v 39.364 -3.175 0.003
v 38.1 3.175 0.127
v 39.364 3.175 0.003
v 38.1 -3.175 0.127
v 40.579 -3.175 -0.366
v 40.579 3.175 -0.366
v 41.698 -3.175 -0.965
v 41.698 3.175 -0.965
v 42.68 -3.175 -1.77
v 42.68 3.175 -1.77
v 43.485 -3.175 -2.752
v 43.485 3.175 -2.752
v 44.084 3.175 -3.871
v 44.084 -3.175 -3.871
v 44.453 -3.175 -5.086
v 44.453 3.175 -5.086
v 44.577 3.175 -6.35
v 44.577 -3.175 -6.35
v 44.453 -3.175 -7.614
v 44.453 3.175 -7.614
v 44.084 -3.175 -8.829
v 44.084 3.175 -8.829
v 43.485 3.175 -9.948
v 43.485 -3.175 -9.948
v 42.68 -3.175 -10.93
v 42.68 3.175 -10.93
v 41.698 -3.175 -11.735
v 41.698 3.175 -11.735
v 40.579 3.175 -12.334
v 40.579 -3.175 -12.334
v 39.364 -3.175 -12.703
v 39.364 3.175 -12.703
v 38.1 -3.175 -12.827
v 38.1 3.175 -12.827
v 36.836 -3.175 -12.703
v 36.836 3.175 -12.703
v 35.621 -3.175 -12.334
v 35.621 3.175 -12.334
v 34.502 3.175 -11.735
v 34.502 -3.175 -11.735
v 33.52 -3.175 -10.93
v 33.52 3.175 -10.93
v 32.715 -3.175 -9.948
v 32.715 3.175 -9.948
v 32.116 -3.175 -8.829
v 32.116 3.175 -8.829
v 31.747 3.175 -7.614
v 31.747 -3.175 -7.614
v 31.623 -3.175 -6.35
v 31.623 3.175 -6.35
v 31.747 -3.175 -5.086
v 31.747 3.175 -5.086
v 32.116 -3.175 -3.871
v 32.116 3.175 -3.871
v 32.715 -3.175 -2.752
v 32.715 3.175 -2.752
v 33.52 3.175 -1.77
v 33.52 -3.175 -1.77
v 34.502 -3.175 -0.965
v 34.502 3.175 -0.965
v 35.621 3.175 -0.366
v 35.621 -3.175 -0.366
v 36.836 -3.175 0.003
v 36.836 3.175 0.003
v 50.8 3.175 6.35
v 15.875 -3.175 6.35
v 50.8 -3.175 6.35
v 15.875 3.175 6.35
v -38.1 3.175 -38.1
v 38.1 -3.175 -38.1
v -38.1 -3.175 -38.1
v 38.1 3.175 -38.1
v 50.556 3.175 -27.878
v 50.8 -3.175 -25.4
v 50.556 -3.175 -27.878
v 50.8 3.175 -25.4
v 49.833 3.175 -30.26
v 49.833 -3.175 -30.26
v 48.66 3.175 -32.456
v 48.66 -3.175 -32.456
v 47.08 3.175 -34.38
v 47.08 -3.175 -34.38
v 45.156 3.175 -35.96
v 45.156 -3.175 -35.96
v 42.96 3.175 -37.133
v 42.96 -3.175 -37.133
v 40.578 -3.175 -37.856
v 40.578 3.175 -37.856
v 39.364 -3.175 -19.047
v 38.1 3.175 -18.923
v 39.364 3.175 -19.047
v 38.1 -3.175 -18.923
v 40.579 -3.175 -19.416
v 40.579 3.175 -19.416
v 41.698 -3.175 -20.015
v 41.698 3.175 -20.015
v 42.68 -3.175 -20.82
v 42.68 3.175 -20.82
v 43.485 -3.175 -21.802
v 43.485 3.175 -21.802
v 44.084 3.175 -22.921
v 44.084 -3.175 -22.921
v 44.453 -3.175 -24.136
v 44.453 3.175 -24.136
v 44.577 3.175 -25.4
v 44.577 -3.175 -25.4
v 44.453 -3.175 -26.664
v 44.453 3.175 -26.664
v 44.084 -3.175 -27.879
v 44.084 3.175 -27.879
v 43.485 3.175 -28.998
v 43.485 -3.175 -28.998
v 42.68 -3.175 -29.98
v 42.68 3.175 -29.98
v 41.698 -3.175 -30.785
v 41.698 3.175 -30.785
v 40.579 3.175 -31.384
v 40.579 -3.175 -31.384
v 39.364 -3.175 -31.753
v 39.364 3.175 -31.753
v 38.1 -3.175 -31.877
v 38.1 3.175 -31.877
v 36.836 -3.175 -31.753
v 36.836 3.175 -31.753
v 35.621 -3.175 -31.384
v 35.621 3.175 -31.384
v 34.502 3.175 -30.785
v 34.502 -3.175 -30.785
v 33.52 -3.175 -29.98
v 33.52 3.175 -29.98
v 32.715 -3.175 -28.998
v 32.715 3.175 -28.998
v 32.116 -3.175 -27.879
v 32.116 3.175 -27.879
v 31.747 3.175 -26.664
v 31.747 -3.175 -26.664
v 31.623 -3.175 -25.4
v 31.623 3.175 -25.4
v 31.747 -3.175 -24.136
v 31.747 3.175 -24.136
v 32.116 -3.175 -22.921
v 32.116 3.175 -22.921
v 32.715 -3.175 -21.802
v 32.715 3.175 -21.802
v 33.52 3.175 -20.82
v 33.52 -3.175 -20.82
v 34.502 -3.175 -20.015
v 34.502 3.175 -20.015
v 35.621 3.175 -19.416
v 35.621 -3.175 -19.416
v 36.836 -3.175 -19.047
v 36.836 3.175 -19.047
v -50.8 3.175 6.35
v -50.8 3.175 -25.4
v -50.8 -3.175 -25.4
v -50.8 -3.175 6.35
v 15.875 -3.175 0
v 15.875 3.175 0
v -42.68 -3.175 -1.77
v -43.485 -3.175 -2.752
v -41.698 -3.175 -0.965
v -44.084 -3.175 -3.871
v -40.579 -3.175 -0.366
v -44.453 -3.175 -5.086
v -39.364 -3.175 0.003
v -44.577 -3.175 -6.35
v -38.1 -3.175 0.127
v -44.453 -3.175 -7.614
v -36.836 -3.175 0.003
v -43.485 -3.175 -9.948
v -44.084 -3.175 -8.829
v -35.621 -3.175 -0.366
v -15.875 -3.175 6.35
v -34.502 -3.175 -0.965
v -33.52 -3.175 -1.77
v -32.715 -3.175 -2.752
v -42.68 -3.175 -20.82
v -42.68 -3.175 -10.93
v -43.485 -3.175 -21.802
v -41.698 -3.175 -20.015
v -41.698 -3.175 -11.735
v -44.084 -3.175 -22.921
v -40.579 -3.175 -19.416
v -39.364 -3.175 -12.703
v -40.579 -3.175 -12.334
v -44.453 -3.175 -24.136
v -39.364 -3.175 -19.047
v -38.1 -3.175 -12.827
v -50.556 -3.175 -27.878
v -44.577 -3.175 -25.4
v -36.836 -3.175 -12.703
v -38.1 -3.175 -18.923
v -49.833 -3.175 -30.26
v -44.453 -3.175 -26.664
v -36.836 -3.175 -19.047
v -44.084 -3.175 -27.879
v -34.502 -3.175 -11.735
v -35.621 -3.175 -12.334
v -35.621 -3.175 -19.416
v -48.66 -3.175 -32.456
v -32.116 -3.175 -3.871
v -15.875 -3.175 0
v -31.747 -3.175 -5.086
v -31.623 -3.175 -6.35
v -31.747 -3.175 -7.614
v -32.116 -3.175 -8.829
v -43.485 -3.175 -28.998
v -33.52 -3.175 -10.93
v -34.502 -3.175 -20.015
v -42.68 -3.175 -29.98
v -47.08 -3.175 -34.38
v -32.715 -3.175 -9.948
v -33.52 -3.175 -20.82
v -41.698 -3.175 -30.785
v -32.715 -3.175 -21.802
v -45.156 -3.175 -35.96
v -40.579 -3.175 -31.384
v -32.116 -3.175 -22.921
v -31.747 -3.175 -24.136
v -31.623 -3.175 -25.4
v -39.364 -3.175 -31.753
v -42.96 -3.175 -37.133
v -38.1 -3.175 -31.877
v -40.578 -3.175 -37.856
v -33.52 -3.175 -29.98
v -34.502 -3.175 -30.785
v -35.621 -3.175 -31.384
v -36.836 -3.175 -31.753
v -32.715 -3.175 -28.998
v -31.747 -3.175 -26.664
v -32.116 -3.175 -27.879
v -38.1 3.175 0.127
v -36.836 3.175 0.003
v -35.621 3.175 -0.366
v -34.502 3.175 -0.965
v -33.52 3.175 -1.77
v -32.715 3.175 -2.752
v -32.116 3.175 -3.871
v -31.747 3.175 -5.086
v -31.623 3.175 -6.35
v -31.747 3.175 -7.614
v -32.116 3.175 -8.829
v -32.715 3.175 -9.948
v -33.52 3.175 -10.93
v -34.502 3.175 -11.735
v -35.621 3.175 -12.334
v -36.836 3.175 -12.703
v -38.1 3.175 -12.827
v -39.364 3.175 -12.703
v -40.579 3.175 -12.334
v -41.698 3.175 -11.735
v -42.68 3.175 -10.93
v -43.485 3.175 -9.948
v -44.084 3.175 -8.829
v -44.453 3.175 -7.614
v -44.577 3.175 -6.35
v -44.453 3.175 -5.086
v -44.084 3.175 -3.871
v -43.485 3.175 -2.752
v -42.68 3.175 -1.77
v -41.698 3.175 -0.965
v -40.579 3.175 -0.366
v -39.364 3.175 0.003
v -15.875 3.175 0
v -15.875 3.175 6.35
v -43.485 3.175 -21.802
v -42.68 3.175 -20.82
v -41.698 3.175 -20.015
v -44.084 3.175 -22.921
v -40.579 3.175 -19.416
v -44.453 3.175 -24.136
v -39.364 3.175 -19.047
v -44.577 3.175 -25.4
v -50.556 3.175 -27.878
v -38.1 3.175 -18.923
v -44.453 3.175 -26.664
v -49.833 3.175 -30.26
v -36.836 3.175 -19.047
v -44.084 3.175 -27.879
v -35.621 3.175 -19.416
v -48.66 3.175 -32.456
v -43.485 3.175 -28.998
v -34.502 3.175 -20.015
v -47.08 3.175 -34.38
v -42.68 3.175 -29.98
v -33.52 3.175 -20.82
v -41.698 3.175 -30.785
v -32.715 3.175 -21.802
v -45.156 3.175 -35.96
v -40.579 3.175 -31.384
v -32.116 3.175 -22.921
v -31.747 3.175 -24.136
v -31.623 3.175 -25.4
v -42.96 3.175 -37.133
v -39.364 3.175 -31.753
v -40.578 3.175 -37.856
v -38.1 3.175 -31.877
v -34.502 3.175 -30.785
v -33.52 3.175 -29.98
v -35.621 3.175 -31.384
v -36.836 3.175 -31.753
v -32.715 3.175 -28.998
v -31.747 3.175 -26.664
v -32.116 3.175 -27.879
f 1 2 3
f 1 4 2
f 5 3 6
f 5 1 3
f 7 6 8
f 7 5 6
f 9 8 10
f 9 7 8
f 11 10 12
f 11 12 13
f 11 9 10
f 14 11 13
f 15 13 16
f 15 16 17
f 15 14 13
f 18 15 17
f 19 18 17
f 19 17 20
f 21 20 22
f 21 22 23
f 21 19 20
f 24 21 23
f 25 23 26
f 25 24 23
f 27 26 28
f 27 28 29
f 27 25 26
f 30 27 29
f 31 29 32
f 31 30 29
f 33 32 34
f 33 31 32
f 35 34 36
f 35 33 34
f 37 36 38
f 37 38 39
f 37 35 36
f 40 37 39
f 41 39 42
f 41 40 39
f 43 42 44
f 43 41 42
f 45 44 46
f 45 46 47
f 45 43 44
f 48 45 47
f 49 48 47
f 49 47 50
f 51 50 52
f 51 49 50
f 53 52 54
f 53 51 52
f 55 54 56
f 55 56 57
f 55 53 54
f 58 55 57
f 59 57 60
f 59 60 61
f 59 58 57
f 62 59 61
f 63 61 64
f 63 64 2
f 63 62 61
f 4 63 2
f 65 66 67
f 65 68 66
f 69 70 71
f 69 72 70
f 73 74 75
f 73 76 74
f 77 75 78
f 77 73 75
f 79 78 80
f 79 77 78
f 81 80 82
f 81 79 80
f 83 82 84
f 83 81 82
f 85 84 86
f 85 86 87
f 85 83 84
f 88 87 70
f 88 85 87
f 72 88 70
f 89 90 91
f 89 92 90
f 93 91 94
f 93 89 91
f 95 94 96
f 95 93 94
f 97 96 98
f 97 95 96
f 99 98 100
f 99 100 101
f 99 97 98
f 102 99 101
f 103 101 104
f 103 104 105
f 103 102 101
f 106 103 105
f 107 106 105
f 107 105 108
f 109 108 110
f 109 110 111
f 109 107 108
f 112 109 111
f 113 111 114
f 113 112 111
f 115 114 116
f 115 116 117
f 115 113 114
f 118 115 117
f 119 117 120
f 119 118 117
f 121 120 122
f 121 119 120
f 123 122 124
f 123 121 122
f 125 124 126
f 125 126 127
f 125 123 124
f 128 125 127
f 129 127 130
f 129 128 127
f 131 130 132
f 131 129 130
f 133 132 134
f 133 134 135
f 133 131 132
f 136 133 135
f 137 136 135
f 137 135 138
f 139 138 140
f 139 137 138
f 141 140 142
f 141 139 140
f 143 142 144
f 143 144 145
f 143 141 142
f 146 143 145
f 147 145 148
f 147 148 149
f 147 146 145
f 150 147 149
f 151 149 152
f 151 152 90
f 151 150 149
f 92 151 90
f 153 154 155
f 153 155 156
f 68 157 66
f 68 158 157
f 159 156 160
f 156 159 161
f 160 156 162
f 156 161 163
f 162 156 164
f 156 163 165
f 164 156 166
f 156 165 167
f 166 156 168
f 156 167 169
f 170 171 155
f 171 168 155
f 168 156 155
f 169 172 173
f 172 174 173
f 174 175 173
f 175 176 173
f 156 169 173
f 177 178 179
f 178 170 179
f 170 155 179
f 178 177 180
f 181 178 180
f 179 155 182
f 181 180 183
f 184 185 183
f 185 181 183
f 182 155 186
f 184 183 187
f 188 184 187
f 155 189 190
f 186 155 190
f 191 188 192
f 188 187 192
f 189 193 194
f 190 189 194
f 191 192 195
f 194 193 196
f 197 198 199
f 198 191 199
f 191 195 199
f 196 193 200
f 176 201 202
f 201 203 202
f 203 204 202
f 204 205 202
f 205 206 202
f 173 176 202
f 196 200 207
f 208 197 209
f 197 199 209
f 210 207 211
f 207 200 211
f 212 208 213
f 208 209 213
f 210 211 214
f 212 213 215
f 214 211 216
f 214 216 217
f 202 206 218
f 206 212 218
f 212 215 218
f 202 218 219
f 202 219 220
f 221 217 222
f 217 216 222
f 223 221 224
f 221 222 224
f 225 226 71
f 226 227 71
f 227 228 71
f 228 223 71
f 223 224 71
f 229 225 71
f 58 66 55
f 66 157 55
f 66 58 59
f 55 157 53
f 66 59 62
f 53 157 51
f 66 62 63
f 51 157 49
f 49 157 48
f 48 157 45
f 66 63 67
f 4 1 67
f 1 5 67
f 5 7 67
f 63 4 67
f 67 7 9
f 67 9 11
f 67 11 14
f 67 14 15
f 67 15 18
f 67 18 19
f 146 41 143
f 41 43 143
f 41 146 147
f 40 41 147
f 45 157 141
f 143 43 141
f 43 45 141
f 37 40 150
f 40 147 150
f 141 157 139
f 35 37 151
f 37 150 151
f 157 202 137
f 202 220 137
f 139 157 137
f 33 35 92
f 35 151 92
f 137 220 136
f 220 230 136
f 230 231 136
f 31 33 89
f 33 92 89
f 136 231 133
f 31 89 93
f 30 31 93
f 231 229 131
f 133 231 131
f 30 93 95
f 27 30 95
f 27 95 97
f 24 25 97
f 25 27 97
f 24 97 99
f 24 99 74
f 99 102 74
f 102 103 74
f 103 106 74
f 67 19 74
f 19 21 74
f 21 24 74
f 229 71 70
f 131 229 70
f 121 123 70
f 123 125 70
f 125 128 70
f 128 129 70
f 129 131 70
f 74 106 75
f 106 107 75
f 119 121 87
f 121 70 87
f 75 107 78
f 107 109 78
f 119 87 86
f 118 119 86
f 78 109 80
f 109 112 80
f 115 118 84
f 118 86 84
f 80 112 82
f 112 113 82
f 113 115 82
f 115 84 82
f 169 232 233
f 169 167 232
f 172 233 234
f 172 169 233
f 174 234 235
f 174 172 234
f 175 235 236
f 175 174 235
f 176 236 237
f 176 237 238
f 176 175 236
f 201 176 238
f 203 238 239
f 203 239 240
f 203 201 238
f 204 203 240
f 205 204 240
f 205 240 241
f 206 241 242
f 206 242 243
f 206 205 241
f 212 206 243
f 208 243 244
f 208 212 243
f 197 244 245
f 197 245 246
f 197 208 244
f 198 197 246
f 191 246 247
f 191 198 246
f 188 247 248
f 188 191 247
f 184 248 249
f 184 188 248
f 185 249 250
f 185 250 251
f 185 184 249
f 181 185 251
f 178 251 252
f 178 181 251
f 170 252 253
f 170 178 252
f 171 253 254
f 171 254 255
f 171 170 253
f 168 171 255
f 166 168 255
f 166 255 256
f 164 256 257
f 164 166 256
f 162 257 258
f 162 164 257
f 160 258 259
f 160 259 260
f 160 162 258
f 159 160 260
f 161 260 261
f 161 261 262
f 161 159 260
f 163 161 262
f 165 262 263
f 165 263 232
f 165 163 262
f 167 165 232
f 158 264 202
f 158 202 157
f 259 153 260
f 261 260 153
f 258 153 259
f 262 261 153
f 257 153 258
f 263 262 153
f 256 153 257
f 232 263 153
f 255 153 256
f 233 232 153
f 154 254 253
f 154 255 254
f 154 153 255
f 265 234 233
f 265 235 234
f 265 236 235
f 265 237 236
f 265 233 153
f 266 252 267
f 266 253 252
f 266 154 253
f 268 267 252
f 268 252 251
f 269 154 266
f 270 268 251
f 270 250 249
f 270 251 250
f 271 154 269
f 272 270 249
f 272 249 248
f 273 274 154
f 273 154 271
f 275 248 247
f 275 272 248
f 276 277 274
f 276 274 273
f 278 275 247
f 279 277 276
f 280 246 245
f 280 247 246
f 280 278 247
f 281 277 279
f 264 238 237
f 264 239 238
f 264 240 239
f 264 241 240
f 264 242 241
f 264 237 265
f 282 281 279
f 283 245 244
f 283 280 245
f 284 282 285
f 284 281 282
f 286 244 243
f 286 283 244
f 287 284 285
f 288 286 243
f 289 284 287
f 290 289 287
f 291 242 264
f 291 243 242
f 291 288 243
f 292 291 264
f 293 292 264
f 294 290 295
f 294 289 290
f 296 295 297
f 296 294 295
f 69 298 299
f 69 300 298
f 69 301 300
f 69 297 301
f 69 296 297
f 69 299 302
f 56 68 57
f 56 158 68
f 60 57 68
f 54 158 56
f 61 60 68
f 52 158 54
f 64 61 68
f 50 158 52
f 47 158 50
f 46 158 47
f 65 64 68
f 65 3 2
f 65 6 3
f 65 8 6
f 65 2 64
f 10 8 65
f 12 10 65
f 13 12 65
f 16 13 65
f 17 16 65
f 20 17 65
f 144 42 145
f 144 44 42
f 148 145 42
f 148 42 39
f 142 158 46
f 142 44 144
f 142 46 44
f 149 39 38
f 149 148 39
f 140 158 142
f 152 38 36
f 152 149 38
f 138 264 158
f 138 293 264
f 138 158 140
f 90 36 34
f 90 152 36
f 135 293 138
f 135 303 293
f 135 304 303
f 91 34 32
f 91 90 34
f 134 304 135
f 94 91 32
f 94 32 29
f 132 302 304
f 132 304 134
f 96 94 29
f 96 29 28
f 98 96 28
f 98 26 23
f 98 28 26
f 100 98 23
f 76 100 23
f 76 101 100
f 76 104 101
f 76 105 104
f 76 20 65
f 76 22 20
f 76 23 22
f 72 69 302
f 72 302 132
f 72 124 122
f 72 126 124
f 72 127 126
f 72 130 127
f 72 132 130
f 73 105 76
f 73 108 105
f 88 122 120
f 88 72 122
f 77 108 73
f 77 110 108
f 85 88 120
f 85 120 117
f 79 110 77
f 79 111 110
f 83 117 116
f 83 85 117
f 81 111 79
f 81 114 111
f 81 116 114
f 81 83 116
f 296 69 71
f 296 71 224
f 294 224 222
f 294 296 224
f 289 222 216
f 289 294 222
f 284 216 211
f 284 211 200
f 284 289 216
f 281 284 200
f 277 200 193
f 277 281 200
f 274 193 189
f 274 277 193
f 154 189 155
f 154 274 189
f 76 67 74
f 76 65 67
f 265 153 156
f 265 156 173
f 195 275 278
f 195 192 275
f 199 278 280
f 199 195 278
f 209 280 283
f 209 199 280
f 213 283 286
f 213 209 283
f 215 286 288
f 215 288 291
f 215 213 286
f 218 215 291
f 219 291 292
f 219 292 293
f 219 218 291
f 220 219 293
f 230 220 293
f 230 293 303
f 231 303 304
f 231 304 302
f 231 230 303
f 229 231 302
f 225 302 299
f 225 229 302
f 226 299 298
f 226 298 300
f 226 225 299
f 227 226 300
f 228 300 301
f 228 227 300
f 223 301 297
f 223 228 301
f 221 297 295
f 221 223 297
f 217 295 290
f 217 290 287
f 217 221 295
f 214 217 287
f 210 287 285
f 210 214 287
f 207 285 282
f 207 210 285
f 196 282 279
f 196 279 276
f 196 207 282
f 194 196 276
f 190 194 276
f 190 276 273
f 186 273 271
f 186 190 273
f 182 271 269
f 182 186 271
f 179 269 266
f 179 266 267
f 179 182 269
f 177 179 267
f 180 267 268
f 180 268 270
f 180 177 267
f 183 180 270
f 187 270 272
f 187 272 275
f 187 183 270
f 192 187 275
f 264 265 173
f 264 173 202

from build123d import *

# Parameters (mm, degrees)
SKETCH1_R           = 6.477
BOSS_EXTRUDE1_DEPTH = 3.175


with BuildPart() as part:
    # Sketch1 → Boss-Extrude1 (new, symmetric)
    with BuildSketch(Plane(origin=(0, 0, 0), x_dir=(1, 0, 0), z_dir=(0, 1, 0))):
        with BuildLine():
            Line((38.1, 38.1), (-38.1, 38.1))
            ThreePointArc((-38.1, 38.1), (-47.080256121, 34.380256121), (-50.8, 25.4))
            Line((-50.8, 25.4), (-50.8, -6.35))
            Line((-50.8, -6.35), (-15.875, -6.35))
            Line((-15.875, -6.35), (-15.875, 0))
            Line((-15.875, 0), (15.875, 0))
            Line((15.875, 0), (15.875, -6.35))
            Line((15.875, -6.35), (50.8, -6.35))
            Line((50.8, -6.35), (50.8, 25.4))
            ThreePointArc((50.8, 25.4), (47.080256121, 34.380256121), (38.1, 38.1))
        make_face()
        with Locations(Location((-38.1, 25.4, 0), (0, 0, 270))):
            Circle(SKETCH1_R, mode=Mode.SUBTRACT)
        with Locations(Location((-38.1, 6.35, 0), (0, 0, 270))):
            Circle(SKETCH1_R, mode=Mode.SUBTRACT)
        with Locations(Location((38.1, 25.4, 0), (0, 0, 270))):
            Circle(SKETCH1_R, mode=Mode.SUBTRACT)
        with Locations(Location((38.1, 6.35, 0), (0, 0, 270))):
            Circle(SKETCH1_R, mode=Mode.SUBTRACT)
    extrude(amount=BOSS_EXTRUDE1_DEPTH, both=True)


solid = part.part
